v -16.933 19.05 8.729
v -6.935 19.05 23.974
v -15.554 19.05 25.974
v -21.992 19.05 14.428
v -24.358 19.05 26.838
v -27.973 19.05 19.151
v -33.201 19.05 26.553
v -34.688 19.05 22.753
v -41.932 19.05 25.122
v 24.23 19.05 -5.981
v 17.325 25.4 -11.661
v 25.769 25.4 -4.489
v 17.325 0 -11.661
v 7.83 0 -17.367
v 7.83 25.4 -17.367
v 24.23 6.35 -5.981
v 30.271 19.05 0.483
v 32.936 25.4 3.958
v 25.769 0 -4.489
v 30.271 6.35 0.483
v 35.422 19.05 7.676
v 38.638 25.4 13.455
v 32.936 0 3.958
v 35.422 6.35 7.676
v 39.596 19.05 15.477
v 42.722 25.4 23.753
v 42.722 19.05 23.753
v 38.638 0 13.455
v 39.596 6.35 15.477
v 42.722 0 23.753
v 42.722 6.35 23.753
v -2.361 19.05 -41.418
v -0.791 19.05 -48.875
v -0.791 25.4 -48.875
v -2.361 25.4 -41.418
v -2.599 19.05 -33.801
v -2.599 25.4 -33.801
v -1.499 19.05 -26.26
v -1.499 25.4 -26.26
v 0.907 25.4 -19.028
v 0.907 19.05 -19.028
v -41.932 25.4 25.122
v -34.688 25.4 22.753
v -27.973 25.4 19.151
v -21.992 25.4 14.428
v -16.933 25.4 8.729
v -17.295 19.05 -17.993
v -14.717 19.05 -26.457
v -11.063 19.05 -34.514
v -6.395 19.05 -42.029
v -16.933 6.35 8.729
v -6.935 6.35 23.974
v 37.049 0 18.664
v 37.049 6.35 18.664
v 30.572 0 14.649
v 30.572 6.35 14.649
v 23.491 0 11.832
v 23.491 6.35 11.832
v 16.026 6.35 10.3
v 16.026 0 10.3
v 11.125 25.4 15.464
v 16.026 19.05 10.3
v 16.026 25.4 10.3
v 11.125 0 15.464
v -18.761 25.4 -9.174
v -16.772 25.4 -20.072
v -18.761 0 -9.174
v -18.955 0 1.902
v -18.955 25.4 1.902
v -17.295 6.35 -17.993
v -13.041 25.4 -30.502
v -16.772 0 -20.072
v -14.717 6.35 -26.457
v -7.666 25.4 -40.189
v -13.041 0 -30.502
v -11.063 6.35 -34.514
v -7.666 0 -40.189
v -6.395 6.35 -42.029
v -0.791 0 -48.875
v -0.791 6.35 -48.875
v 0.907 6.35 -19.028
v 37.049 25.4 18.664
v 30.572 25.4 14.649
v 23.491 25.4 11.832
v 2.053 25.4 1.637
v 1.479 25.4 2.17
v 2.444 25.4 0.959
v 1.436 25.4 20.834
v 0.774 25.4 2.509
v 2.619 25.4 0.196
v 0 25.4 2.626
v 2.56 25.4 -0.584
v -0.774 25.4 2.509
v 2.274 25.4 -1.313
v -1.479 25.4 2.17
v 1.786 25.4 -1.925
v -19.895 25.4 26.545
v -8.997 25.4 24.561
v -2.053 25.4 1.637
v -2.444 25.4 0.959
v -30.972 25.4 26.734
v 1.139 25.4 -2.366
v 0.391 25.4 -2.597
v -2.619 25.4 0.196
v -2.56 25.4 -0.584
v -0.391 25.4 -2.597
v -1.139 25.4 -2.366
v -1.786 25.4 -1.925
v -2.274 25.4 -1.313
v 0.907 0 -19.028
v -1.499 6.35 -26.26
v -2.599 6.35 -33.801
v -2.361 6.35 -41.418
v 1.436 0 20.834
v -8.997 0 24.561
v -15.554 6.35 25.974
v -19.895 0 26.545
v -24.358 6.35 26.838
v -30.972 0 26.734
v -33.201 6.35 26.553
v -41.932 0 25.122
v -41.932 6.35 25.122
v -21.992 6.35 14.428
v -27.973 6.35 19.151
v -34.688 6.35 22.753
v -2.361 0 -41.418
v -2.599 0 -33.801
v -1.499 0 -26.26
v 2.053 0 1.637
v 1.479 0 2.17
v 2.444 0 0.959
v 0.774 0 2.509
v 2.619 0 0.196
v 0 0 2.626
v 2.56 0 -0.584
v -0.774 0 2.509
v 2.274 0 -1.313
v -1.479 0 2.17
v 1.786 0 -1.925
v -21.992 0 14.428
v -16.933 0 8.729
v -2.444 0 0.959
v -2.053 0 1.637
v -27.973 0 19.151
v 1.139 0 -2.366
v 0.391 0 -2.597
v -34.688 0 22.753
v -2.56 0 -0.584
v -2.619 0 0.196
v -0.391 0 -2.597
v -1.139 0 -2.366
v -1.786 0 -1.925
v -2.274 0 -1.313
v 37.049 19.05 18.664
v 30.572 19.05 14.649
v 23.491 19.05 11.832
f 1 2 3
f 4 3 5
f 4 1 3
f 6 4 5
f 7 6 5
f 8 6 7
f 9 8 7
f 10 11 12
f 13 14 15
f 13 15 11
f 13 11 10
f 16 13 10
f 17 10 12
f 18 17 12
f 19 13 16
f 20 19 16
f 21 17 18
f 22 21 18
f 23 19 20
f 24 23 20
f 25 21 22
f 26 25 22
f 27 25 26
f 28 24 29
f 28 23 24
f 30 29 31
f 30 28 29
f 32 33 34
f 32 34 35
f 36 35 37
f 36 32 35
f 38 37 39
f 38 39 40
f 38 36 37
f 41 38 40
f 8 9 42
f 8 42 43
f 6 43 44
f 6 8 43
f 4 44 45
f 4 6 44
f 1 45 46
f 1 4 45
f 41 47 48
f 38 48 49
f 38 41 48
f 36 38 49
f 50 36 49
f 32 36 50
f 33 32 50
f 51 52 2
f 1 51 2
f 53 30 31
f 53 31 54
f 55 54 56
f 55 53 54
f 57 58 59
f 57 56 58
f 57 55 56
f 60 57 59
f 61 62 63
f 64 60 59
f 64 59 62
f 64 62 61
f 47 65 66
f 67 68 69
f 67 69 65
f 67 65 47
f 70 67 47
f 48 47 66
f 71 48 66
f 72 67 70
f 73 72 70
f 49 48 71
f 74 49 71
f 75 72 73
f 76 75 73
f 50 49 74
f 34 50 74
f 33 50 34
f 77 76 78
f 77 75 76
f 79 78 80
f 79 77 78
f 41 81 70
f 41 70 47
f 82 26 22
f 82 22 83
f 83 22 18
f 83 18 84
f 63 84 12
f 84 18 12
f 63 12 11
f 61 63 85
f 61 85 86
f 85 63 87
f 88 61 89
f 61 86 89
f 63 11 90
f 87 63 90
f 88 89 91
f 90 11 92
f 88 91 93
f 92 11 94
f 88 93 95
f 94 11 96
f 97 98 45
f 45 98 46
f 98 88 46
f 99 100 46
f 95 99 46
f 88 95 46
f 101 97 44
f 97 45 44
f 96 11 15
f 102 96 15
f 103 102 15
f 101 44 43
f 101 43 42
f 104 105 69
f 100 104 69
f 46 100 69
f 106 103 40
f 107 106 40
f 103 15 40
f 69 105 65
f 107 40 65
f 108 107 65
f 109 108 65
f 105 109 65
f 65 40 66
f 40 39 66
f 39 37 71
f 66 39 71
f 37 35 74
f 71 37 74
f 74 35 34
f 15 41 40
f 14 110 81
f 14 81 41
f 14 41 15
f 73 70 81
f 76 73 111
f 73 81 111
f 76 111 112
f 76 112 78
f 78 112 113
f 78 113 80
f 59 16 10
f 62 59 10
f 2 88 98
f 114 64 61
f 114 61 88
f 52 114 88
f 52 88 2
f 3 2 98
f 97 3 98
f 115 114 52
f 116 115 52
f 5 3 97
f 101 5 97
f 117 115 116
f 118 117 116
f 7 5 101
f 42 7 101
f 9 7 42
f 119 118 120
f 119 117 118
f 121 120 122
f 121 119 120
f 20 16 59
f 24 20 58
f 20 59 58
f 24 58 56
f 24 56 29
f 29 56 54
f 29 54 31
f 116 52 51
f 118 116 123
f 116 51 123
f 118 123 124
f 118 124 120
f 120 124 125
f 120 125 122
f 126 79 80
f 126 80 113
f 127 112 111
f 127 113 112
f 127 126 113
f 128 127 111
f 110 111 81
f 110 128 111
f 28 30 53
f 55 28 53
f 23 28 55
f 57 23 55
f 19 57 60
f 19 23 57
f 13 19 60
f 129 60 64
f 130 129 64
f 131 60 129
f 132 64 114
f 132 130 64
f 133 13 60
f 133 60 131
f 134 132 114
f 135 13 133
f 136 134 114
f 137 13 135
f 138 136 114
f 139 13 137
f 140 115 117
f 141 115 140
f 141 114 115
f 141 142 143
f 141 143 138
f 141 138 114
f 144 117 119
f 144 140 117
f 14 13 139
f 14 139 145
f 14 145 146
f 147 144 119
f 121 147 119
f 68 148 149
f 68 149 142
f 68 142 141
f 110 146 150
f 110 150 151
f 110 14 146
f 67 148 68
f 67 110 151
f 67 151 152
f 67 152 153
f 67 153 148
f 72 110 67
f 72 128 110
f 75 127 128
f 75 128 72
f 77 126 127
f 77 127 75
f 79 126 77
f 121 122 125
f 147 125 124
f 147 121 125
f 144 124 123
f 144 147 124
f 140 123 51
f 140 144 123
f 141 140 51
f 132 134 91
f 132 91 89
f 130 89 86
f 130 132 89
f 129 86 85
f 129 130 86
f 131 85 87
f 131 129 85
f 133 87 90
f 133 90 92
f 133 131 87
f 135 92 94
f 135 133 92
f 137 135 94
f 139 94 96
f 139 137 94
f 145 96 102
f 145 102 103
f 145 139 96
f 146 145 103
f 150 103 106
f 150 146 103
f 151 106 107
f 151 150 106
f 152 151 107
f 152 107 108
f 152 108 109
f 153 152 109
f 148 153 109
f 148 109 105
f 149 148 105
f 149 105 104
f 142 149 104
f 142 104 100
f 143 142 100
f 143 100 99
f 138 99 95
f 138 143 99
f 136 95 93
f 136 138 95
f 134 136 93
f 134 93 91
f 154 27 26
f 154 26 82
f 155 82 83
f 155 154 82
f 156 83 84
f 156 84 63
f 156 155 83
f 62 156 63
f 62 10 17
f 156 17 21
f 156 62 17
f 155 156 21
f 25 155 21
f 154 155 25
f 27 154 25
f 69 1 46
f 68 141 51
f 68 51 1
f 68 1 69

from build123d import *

# Parameters (mm, degrees)
BOSS_EXTRUDE2_DEPTH = 25.4
SKETCH6_W           = 29.894889523
SKETCH6_H           = 12.7
CUT_EXTRUDE2_DEPTH  = 25.4
SKETCH7_W           = 29.894889523
SKETCH7_H           = 12.7
CUT_EXTRUDE3_DEPTH  = 25.4
SKETCH8_W           = 29.894889523
SKETCH8_H           = 12.7
CUT_EXTRUDE4_DEPTH  = 25.4
SKETCH9_R           = 2.625984609
CUT_EXTRUDE5_DEPTH  = 25.4


with BuildPart() as part:
    # Sketch5 → Boss-Extrude2 (new body)
    with BuildSketch(Plane(origin=(0, 0, 0), x_dir=(1, 0, 0), z_dir=(0, 1, 0))):
        with BuildLine():
            Line((0.906871592, 19.028402033), (7.829859105, 17.366513939))
            ThreePointArc((7.829859105, 17.366513939), (29.524645576, 0.411973336), (42.722311342, -23.75291494))
            ThreePointArc((42.722311342, -23.75291494), (30.571840916, -14.649217341), (16.025643758, -10.299574853))
            Line((16.025643758, -10.299574853), (11.124912694, -15.464113863))
            ThreePointArc((11.124912694, -15.464113863), (-14.405543413, -25.775079775), (-41.931783423, -25.12214946))
            ThreePointArc((-41.931783423, -25.12214946), (-27.972514821, -19.151382203), (-16.93251535, -8.72882718))
            Line((-16.93251535, -8.72882718), (-18.954771799, -1.902400076))
            ThreePointArc((-18.954771799, -1.902400076), (-15.119102163, 25.363106438), (-0.790527919, 48.8750644))
            ThreePointArc((-0.790527919, 48.8750644), (-2.599326095, 33.800599544), (0.906871592, 19.028402033))
        make_face()
    extrude(amount=BOSS_EXTRUDE2_DEPTH)

    # Sketch6 → Cut-Extrude2 (cut)
    with BuildSketch(Plane(origin=(1.982617129, 0, -0.112752753), x_dir=(-0.05677891901057157, 0, -0.9983867759320488), z_dir=(0.9983867759320488, 0, -0.05677891901057157))):
        with Locations((33.89365853, 12.7)):
            Rectangle(SKETCH6_W, SKETCH6_H)
    extrude(amount=-CUT_EXTRUDE2_DEPTH, mode=Mode.SUBTRACT)

    # Sketch7 → Cut-Extrude3 (cut)
    with BuildSketch(Plane(origin=(-0.893661816, 0, 1.773373176), x_dir=(0.8930177702648826, 0, 0.45002140170344945), z_dir=(-0.4500214017034494, 0, 0.8930177702648825))):
        with Locations((33.89365853, 12.7)):
            Rectangle(SKETCH7_W, SKETCH7_H)
    extrude(amount=-CUT_EXTRUDE3_DEPTH, mode=Mode.SUBTRACT)

    # Sketch8 → Cut-Extrude4 (cut)
    with BuildSketch(Plane(origin=(-1.088955313, 0, -1.660620423), x_dir=(-0.8362388512543109, 0, 0.5483653742285982), z_dir=(-0.5483653742285982, 0, -0.8362388512543109))):
        with Locations((33.89365853, 12.7)):
            Rectangle(SKETCH8_W, SKETCH8_H)
    extrude(amount=-CUT_EXTRUDE4_DEPTH, mode=Mode.SUBTRACT)

    # Sketch9 → Cut-Extrude5 (cut)
    with BuildSketch(Plane(origin=(0, 0, 0), x_dir=(1, 0, 0), z_dir=(0, 1, 0))):
        with Locations(Location((0, 0, 0), (0, 0, 270))):
            Circle(SKETCH9_R)
    extrude(amount=CUT_EXTRUDE5_DEPTH, mode=Mode.SUBTRACT)


solid = part.part
